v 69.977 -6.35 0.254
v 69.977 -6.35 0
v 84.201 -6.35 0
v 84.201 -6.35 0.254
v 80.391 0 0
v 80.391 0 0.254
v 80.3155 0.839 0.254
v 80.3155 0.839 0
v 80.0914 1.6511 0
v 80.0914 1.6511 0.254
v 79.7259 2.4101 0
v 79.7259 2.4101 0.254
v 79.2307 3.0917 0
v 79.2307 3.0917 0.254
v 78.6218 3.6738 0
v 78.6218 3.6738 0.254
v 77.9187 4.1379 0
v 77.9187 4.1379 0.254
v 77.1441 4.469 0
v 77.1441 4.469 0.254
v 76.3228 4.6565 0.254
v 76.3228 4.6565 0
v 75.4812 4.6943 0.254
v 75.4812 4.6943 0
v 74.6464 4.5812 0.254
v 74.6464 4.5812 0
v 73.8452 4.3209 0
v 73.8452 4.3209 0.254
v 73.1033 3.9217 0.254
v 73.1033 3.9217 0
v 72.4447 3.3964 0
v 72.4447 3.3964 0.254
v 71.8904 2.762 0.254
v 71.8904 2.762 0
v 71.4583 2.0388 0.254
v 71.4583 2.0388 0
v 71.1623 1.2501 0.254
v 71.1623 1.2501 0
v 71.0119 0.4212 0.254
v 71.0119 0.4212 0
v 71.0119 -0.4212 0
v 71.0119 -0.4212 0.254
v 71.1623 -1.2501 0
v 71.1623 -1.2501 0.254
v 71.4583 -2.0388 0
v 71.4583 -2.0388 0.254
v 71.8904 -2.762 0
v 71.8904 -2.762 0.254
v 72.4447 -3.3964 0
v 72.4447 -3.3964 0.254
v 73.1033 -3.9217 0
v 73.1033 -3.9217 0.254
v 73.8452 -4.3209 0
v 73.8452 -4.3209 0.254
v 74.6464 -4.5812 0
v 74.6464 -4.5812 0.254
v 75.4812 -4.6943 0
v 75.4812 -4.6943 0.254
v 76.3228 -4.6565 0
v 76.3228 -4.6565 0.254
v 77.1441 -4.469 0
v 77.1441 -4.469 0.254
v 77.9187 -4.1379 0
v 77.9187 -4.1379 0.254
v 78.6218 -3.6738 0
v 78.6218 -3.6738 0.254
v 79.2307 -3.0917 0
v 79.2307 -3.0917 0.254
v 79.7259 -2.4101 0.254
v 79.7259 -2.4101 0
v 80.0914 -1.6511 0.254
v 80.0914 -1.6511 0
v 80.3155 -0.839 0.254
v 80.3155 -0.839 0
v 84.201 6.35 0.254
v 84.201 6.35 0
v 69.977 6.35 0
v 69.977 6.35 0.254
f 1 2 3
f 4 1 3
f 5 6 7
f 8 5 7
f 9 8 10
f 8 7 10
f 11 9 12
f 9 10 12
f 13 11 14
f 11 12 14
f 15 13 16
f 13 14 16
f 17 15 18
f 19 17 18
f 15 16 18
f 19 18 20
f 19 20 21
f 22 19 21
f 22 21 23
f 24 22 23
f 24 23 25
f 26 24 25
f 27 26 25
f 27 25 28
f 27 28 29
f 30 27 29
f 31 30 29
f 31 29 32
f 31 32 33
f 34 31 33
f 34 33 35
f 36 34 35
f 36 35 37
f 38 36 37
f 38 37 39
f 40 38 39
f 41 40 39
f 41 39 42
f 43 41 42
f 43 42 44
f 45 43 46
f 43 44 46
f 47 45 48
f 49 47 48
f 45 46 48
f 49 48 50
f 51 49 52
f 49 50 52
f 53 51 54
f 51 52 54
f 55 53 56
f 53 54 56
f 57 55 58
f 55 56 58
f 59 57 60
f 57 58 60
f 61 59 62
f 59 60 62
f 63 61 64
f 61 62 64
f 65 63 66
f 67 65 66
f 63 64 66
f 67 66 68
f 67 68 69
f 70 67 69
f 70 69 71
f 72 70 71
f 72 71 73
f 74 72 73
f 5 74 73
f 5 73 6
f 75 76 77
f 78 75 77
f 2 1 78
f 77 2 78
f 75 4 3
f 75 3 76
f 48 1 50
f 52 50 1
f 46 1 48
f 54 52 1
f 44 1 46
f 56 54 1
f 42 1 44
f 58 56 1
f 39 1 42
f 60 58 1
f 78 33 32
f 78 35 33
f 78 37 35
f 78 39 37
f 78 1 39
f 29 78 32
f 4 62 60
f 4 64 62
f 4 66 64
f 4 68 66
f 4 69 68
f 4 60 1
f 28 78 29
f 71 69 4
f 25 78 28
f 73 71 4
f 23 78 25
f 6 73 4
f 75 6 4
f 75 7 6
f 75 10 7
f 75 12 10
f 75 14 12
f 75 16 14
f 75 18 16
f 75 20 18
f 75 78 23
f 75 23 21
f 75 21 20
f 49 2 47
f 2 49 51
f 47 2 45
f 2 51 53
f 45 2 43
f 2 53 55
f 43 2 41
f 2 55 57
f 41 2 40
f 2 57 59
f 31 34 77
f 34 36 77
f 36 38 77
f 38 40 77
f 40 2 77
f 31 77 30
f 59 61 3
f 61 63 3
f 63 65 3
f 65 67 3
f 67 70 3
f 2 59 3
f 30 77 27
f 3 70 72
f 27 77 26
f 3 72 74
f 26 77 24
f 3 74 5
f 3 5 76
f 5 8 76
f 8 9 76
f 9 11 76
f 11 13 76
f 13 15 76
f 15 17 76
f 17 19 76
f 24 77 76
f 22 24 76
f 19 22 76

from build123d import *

# Parameters (mm, degrees)
BOSS_EXTRUDE1_DEPTH = 0.254
SKETCH2_R           = 4.699
CUT_EXTRUDE1_DEPTH  = 1.254
SKETCH3_W           = 2.54
SKETCH3_H           = 0.635
CUT_EXTRUDE2_DEPTH  = 1.254
SKETCH5_OUTSIDE_W   = 121.447
SKETCH5_OUTSIDE_H   = 109.618
SKETCH5_OUTSIDE_W_2 = 14.224
SKETCH5_OUTSIDE_H_2 = 15.24
CUT_EXTRUDE5_DEPTH  = 1.254


with BuildPart() as part:
    # Sketch1 → Boss-Extrude1 (new body)
    with BuildSketch(Plane.XY):
        with BuildLine():
            Line((67.21146711, 76.191723231), (8.696654013, 17.676910134))
            Line((8.696654013, 17.676910134), (7.228954972, 14.133571205))
            ThreePointArc((7.228954972, 14.133571205), (14.666587579, 6.075099489), (15.105587123, -4.88230096))
            Line((15.105587123, -4.88230096), (18.648926052, -6.35))
            Line((18.648926052, -6.35), (101.401368334, -6.35))
            ThreePointArc((101.401368334, -6.35), (93.866160503, 38.880636728), (67.21146711, 76.191723231))
        make_face()
        with BuildLine():
            Line((88.672924278, 6.35), (27.86051193, 6.35))
            ThreePointArc((27.86051193, 6.35), (26.399857642, 10.93517908), (24.190484974, 15.210228852))
            Line((24.190484974, 15.210228852), (67.191354125, 58.211098004))
            ThreePointArc((67.191354125, 58.211098004), (82.13289044, 34.020557137), (88.672924278, 6.35))
        make_face(mode=Mode.SUBTRACT)
    extrude(amount=BOSS_EXTRUDE1_DEPTH)

    # Sketch2 → Cut-Extrude1 (cut, through all)
    with BuildSketch(Plane.XY.offset(0.254)):
        with Locations((22.225, 0)):
            Circle(SKETCH2_R)
        with Locations((36.195, 0)):
            Circle(SKETCH2_R)
        with Locations((61.722, 0)):
            Circle(SKETCH2_R)
        with Locations((75.692, 0)):
            Circle(SKETCH2_R)
        with Locations((95.25, 0)):
            Circle(SKETCH2_R)
        with Locations((15.715448212, 15.715448212)):
            Circle(SKETCH2_R)
        with Locations((25.593729945, 25.593729945)):
            Circle(SKETCH2_R)
        with Locations((43.644044748, 43.644044748)):
            Circle(SKETCH2_R)
        with Locations((53.522326482, 53.522326482)):
            Circle(SKETCH2_R)
        with Locations((92.004434954, 24.652514046)):
            Circle(SKETCH2_R)
        with Locations((82.48891971, 47.625)):
            Circle(SKETCH2_R)
        with Locations((67.351920908, 67.351920908)):
            Circle(SKETCH2_R)
    extrude(amount=-CUT_EXTRUDE1_DEPTH, mode=Mode.SUBTRACT)

    # Sketch3 → Cut-Extrude2 (cut, through all)
    with BuildSketch(Plane.XY.offset(0.254)):
        Polygon((15.266435406, 24.246691527), (17.06248663, 26.042742751), (17.511499436, 25.593729945), (15.715448212, 23.797678721), align=None)
        Polygon((44.991083167, 53.971339288), (43.195031942, 52.175288063), (43.644044748, 51.726275257), (45.440095973, 53.522326482), align=None)
        with Locations((29.21, -6.0325)):
            Rectangle(SKETCH3_W, SKETCH3_H)
        with Locations((68.707, -6.0325)):
            Rectangle(SKETCH3_W, SKETCH3_H)
        Polygon((29.230733674, 38.210989795), (31.026784898, 40.007041019), (31.475797704, 39.558028213), (29.67974648, 37.761976989), align=None)
        Polygon((56.845021246, 65.825277367), (55.048970022, 64.029226143), (55.497982828, 63.580213337), (57.294034052, 65.376264561), align=None)
        with Locations((48.9585, -6.0325)):
            Rectangle(SKETCH3_W, SKETCH3_H)
        with Locations((85.471, -6.0325)):
            Rectangle(SKETCH3_W, SKETCH3_H)
        Polygon((99.935462164, 14.437711971), (100.266998693, 11.919442024), (101.526133667, 12.085210288), (101.194597138, 14.603480236), align=None)
        Polygon((93.765504959, 37.464305742), (94.938831965, 37.950313702), (93.966816047, 40.296967714), (92.793489041, 39.810959755), align=None)
        Polygon((79.327792988, 62.471156422), (80.874047017, 60.456038938), (81.88160576, 61.229165953), (80.33535173, 63.244283437), align=None)
        Polygon((13.593916116, 7.005422516), (14.565932035, 4.658768503), (15.739259041, 5.144776462), (14.767243123, 7.491430475), align=None)
    extrude(amount=-CUT_EXTRUDE2_DEPTH, mode=Mode.SUBTRACT)

    # Sketch5 outside → Cut-Extrude5 (cut, through all)
    with BuildSketch(Plane.XY.offset(0.254)):
        with Locations((54.4145, 34.921)):
            Rectangle(SKETCH5_OUTSIDE_W, SKETCH5_OUTSIDE_H)
        with Locations((77.089, 0)):
            Rectangle(SKETCH5_OUTSIDE_W_2, SKETCH5_OUTSIDE_H_2, mode=Mode.SUBTRACT)
    extrude(amount=-CUT_EXTRUDE5_DEPTH, mode=Mode.SUBTRACT)


solid = part.part
